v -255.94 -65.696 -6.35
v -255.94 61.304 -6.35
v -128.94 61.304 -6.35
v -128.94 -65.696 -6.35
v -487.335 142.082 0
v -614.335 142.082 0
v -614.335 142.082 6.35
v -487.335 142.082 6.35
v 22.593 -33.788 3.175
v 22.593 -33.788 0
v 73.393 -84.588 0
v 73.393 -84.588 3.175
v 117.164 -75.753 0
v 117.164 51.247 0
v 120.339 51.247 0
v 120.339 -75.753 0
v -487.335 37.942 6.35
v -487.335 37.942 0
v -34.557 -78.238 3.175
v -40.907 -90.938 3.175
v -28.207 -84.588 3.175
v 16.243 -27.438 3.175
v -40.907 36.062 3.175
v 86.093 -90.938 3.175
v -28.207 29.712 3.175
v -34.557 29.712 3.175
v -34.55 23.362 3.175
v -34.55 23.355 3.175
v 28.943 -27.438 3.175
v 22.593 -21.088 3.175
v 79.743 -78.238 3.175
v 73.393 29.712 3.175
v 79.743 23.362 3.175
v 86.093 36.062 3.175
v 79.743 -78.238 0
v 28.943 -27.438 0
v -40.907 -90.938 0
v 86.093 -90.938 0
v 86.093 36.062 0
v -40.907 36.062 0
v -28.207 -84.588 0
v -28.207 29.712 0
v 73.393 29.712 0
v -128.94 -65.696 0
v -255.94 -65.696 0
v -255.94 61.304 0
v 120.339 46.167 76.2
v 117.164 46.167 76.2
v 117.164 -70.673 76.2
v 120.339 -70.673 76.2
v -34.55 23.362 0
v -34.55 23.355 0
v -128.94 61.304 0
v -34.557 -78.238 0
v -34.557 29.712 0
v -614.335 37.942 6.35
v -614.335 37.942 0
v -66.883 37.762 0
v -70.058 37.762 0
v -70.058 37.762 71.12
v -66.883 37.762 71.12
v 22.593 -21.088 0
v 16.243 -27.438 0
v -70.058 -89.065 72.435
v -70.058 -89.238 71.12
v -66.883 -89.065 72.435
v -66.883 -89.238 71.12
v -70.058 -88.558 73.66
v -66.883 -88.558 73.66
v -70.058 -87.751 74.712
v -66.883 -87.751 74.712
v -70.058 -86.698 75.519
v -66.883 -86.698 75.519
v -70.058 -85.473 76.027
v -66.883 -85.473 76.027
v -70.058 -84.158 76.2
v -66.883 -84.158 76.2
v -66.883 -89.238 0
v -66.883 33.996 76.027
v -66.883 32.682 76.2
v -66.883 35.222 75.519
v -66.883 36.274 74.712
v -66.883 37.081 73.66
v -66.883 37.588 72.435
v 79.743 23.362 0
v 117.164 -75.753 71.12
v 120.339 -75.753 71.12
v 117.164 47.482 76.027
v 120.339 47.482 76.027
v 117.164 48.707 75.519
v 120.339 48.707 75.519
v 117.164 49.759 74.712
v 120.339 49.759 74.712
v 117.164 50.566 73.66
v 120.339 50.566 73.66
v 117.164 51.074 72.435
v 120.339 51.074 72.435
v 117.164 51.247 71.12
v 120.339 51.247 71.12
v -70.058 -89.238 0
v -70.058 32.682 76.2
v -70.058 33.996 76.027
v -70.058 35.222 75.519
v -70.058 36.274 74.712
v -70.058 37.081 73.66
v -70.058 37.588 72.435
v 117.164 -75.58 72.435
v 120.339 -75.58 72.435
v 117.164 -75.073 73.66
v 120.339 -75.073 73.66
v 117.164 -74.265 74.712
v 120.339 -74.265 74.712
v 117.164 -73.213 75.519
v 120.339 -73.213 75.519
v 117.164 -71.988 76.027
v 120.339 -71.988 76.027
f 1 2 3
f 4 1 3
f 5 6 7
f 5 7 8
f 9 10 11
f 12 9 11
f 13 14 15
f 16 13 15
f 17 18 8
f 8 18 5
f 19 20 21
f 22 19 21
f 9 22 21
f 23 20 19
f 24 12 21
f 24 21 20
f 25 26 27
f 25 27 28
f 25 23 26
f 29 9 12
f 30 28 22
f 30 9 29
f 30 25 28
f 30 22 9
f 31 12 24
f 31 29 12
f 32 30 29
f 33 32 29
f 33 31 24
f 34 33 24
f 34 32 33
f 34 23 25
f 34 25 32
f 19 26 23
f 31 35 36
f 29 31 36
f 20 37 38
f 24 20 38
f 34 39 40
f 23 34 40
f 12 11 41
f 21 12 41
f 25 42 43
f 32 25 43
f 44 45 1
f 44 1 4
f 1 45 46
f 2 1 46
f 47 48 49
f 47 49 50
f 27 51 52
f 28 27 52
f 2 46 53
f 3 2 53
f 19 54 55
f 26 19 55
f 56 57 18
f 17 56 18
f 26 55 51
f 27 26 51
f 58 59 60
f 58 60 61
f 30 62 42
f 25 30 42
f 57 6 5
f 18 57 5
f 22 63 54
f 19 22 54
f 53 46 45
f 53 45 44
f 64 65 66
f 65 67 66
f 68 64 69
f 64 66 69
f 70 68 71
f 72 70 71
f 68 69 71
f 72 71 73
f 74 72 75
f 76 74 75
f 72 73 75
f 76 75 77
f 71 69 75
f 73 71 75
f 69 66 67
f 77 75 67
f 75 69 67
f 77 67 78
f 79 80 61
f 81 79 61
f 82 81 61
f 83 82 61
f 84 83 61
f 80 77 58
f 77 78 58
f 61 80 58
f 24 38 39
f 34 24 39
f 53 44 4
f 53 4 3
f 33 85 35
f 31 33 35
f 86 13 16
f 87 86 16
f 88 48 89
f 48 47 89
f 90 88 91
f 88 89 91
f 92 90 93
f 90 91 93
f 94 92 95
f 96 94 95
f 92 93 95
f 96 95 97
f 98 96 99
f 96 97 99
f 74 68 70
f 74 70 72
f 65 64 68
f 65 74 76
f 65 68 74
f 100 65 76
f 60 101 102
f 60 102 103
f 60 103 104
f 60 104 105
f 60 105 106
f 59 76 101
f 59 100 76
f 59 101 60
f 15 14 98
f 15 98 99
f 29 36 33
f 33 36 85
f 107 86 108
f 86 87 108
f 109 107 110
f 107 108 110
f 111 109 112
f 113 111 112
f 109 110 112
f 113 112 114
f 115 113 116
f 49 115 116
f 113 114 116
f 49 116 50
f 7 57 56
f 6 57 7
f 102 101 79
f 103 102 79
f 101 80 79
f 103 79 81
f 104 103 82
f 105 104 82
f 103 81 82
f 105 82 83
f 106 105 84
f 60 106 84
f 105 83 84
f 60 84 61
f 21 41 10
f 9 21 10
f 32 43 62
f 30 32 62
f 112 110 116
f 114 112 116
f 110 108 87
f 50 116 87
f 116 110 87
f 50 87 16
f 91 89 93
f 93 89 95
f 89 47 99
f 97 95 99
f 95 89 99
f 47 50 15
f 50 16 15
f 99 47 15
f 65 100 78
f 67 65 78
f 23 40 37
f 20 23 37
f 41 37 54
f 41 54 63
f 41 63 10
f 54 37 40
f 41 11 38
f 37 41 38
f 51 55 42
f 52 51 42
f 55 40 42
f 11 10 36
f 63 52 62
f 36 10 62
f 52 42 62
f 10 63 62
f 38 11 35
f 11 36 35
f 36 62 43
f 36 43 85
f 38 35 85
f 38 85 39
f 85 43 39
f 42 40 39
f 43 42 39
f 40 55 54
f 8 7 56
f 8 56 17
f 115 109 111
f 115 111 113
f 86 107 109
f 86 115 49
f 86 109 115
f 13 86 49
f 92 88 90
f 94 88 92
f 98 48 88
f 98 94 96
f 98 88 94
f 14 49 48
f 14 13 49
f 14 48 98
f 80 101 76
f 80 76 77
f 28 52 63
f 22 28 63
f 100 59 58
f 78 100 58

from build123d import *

# Parameters (mm, degrees)
F0_W      = 6.35
F0_H      = 6.35
F1_DEPTH  = 3.175
F2_W      = 3.175
F2_H      = 127
F3_DEPTH  = 76.2
F4_W      = 3.175
F4_H      = 127
F5_DEPTH  = 76.2
F6_W      = 127
F6_H      = 127
F7_DEPTH  = 6.35
F8_R      = 5.08
F9_R      = 5.08
F10_R     = 5.08
F11_R     = 5.08
F12_W     = 127
F12_H     = 104.14
F13_DEPTH = 6.35


# Not quite as in the source:
# - a length typed as a fraction of an inch, garbled in the dataset ("3 / 203.2 mm" for 3/8 in), is restored


with BuildPart() as f1:
    # F0 (on Top) → F1 (new body)
    with BuildSketch(Plane.XY):
        Polygon((-34.5571719459, -84.5880480751), (-40.9071719459, -84.5880480751), (-40.9071719459, -90.9380480751), (86.0928280541, -90.9380480751), (86.0928280541, -84.5880480751), (79.7428280541, -84.5880480751), (73.3928280541, -84.5880480751), (63.2345444911, -84.5880480751), (-28.2071719459, -84.5880480751), align=None)
        Polygon((79.7428280541, -78.2380480751), (28.9428280541, -27.4380480751), (22.5928280541, -33.7880480751), (73.3928280541, -84.5880480751), (73.3928280541, -78.2380480751), align=None)
        with Locations((76.5678280541, -81.4130480751)):
            Rectangle(F0_W, F0_H)
        with Locations((-31.3821719459, -81.4130480751)):
            Rectangle(F0_W, F0_H)
        Polygon((16.2428280541, -27.4380480751), (-34.5571719459, -78.2380480751), (-28.2071719459, -78.2380480751), (-28.2071719459, -84.5880480751), (22.5928280541, -33.7880480751), align=None)
        Polygon((22.5928280541, -21.0880480751), (-28.2071719459, 29.7119519249), (-28.2071719459, 23.3619519249), (-34.5498589529, 23.3619519249), (-34.5498505211, 23.3546305002), (16.2428280541, -27.4380480751), align=None)
        Polygon((28.9428280541, -27.4380480751), (22.5928280541, -21.0880480751), (16.2428280541, -27.4380480751), (22.5928280541, -33.7880480751), align=None)
        Polygon((73.3928280541, 23.3619519249), (73.3928280541, 29.7119519249), (22.5928280541, -21.0880480751), (28.9428280541, -27.4380480751), (79.7428280541, 23.3619519249), align=None)
        with Locations((76.5678280541, 26.5369519249)):
            Rectangle(F0_W, F0_H)
        Polygon((-28.2071719459, 29.7119519249), (-34.5571719459, 29.7119519249), (-34.5498589529, 23.3619519249), (-28.2071719459, 23.3619519249), align=None)
        Polygon((-40.9071719459, 29.7119519249), (-34.5571719459, 29.7119519249), (-28.2071719459, 29.7119519249), (73.3928280541, 29.7119519249), (79.7428280541, 29.7119519249), (86.0928280541, 29.7119519249), (86.0928280541, 36.0619519249), (-40.9071719459, 36.0619519249), align=None)
        Polygon((-34.5571719459, 23.3619519249), (-34.5571719459, 29.7119519249), (-40.9071719459, 29.7119519249), (-40.9071719459, -84.5880480751), (-34.5571719459, -84.5880480751), (-34.5571719459, -78.2380480751), align=None)
        Polygon((86.0928280541, 29.7119519249), (79.7428280541, 29.7119519249), (79.7428280541, 23.3619519249), (79.7428280541, -78.2380480751), (79.7428280541, -84.5880480751), (86.0928280541, -84.5880480751), align=None)
    extrude(amount=F1_DEPTH)


with BuildPart() as f3:
    # F2 (on Top) → F3 (new body)
    with BuildSketch(Plane.XY):
        with Locations((-68.4703838587, -25.738487184)):
            Rectangle(F2_W, F2_H)
    extrude(amount=F3_DEPTH)

    # F8
    f8_edges = [f3.edges().sort_by_distance(p)[0] for p in [
        (-68.470384, -89.238487, 76.2),
    ]]
    fillet(f8_edges, radius=F8_R)

    # F9
    f9_edges = [f3.edges().sort_by_distance(p)[0] for p in [
        (-68.470384, 37.761513, 76.2),
    ]]
    fillet(f9_edges, radius=F9_R)


with BuildPart() as f5:
    # F4 (on Top) → F5 (new body)
    with BuildSketch(Plane.XY):
        with Locations((118.7510346651, -12.2532194257)):
            Rectangle(F4_W, F4_H)
    extrude(amount=F5_DEPTH)

    # F10
    f10_edges = [f5.edges().sort_by_distance(p)[0] for p in [
        (118.751035, -75.753219, 76.2),
    ]]
    fillet(f10_edges, radius=F10_R)

    # F11
    f11_edges = [f5.edges().sort_by_distance(p)[0] for p in [
        (118.751035, 51.246781, 76.2),
    ]]
    fillet(f11_edges, radius=F11_R)


with BuildPart() as f7:
    # F6 (on Top) → F7 (new body)
    with BuildSketch(Plane.XY):
        with Locations((-192.4403140545, -2.1958520412)):
            Rectangle(F6_W, F6_H)
    extrude(amount=-F7_DEPTH)


with BuildPart() as f13:
    # F12 (on Top) → F13 (new body)
    with BuildSketch(Plane.XY):
        with Locations((-550.8351667404, 90.0116942596)):
            Rectangle(F12_W, F12_H)
    extrude(amount=F13_DEPTH)


solid = Compound([f1.part, f3.part, f5.part, f7.part, f13.part])
